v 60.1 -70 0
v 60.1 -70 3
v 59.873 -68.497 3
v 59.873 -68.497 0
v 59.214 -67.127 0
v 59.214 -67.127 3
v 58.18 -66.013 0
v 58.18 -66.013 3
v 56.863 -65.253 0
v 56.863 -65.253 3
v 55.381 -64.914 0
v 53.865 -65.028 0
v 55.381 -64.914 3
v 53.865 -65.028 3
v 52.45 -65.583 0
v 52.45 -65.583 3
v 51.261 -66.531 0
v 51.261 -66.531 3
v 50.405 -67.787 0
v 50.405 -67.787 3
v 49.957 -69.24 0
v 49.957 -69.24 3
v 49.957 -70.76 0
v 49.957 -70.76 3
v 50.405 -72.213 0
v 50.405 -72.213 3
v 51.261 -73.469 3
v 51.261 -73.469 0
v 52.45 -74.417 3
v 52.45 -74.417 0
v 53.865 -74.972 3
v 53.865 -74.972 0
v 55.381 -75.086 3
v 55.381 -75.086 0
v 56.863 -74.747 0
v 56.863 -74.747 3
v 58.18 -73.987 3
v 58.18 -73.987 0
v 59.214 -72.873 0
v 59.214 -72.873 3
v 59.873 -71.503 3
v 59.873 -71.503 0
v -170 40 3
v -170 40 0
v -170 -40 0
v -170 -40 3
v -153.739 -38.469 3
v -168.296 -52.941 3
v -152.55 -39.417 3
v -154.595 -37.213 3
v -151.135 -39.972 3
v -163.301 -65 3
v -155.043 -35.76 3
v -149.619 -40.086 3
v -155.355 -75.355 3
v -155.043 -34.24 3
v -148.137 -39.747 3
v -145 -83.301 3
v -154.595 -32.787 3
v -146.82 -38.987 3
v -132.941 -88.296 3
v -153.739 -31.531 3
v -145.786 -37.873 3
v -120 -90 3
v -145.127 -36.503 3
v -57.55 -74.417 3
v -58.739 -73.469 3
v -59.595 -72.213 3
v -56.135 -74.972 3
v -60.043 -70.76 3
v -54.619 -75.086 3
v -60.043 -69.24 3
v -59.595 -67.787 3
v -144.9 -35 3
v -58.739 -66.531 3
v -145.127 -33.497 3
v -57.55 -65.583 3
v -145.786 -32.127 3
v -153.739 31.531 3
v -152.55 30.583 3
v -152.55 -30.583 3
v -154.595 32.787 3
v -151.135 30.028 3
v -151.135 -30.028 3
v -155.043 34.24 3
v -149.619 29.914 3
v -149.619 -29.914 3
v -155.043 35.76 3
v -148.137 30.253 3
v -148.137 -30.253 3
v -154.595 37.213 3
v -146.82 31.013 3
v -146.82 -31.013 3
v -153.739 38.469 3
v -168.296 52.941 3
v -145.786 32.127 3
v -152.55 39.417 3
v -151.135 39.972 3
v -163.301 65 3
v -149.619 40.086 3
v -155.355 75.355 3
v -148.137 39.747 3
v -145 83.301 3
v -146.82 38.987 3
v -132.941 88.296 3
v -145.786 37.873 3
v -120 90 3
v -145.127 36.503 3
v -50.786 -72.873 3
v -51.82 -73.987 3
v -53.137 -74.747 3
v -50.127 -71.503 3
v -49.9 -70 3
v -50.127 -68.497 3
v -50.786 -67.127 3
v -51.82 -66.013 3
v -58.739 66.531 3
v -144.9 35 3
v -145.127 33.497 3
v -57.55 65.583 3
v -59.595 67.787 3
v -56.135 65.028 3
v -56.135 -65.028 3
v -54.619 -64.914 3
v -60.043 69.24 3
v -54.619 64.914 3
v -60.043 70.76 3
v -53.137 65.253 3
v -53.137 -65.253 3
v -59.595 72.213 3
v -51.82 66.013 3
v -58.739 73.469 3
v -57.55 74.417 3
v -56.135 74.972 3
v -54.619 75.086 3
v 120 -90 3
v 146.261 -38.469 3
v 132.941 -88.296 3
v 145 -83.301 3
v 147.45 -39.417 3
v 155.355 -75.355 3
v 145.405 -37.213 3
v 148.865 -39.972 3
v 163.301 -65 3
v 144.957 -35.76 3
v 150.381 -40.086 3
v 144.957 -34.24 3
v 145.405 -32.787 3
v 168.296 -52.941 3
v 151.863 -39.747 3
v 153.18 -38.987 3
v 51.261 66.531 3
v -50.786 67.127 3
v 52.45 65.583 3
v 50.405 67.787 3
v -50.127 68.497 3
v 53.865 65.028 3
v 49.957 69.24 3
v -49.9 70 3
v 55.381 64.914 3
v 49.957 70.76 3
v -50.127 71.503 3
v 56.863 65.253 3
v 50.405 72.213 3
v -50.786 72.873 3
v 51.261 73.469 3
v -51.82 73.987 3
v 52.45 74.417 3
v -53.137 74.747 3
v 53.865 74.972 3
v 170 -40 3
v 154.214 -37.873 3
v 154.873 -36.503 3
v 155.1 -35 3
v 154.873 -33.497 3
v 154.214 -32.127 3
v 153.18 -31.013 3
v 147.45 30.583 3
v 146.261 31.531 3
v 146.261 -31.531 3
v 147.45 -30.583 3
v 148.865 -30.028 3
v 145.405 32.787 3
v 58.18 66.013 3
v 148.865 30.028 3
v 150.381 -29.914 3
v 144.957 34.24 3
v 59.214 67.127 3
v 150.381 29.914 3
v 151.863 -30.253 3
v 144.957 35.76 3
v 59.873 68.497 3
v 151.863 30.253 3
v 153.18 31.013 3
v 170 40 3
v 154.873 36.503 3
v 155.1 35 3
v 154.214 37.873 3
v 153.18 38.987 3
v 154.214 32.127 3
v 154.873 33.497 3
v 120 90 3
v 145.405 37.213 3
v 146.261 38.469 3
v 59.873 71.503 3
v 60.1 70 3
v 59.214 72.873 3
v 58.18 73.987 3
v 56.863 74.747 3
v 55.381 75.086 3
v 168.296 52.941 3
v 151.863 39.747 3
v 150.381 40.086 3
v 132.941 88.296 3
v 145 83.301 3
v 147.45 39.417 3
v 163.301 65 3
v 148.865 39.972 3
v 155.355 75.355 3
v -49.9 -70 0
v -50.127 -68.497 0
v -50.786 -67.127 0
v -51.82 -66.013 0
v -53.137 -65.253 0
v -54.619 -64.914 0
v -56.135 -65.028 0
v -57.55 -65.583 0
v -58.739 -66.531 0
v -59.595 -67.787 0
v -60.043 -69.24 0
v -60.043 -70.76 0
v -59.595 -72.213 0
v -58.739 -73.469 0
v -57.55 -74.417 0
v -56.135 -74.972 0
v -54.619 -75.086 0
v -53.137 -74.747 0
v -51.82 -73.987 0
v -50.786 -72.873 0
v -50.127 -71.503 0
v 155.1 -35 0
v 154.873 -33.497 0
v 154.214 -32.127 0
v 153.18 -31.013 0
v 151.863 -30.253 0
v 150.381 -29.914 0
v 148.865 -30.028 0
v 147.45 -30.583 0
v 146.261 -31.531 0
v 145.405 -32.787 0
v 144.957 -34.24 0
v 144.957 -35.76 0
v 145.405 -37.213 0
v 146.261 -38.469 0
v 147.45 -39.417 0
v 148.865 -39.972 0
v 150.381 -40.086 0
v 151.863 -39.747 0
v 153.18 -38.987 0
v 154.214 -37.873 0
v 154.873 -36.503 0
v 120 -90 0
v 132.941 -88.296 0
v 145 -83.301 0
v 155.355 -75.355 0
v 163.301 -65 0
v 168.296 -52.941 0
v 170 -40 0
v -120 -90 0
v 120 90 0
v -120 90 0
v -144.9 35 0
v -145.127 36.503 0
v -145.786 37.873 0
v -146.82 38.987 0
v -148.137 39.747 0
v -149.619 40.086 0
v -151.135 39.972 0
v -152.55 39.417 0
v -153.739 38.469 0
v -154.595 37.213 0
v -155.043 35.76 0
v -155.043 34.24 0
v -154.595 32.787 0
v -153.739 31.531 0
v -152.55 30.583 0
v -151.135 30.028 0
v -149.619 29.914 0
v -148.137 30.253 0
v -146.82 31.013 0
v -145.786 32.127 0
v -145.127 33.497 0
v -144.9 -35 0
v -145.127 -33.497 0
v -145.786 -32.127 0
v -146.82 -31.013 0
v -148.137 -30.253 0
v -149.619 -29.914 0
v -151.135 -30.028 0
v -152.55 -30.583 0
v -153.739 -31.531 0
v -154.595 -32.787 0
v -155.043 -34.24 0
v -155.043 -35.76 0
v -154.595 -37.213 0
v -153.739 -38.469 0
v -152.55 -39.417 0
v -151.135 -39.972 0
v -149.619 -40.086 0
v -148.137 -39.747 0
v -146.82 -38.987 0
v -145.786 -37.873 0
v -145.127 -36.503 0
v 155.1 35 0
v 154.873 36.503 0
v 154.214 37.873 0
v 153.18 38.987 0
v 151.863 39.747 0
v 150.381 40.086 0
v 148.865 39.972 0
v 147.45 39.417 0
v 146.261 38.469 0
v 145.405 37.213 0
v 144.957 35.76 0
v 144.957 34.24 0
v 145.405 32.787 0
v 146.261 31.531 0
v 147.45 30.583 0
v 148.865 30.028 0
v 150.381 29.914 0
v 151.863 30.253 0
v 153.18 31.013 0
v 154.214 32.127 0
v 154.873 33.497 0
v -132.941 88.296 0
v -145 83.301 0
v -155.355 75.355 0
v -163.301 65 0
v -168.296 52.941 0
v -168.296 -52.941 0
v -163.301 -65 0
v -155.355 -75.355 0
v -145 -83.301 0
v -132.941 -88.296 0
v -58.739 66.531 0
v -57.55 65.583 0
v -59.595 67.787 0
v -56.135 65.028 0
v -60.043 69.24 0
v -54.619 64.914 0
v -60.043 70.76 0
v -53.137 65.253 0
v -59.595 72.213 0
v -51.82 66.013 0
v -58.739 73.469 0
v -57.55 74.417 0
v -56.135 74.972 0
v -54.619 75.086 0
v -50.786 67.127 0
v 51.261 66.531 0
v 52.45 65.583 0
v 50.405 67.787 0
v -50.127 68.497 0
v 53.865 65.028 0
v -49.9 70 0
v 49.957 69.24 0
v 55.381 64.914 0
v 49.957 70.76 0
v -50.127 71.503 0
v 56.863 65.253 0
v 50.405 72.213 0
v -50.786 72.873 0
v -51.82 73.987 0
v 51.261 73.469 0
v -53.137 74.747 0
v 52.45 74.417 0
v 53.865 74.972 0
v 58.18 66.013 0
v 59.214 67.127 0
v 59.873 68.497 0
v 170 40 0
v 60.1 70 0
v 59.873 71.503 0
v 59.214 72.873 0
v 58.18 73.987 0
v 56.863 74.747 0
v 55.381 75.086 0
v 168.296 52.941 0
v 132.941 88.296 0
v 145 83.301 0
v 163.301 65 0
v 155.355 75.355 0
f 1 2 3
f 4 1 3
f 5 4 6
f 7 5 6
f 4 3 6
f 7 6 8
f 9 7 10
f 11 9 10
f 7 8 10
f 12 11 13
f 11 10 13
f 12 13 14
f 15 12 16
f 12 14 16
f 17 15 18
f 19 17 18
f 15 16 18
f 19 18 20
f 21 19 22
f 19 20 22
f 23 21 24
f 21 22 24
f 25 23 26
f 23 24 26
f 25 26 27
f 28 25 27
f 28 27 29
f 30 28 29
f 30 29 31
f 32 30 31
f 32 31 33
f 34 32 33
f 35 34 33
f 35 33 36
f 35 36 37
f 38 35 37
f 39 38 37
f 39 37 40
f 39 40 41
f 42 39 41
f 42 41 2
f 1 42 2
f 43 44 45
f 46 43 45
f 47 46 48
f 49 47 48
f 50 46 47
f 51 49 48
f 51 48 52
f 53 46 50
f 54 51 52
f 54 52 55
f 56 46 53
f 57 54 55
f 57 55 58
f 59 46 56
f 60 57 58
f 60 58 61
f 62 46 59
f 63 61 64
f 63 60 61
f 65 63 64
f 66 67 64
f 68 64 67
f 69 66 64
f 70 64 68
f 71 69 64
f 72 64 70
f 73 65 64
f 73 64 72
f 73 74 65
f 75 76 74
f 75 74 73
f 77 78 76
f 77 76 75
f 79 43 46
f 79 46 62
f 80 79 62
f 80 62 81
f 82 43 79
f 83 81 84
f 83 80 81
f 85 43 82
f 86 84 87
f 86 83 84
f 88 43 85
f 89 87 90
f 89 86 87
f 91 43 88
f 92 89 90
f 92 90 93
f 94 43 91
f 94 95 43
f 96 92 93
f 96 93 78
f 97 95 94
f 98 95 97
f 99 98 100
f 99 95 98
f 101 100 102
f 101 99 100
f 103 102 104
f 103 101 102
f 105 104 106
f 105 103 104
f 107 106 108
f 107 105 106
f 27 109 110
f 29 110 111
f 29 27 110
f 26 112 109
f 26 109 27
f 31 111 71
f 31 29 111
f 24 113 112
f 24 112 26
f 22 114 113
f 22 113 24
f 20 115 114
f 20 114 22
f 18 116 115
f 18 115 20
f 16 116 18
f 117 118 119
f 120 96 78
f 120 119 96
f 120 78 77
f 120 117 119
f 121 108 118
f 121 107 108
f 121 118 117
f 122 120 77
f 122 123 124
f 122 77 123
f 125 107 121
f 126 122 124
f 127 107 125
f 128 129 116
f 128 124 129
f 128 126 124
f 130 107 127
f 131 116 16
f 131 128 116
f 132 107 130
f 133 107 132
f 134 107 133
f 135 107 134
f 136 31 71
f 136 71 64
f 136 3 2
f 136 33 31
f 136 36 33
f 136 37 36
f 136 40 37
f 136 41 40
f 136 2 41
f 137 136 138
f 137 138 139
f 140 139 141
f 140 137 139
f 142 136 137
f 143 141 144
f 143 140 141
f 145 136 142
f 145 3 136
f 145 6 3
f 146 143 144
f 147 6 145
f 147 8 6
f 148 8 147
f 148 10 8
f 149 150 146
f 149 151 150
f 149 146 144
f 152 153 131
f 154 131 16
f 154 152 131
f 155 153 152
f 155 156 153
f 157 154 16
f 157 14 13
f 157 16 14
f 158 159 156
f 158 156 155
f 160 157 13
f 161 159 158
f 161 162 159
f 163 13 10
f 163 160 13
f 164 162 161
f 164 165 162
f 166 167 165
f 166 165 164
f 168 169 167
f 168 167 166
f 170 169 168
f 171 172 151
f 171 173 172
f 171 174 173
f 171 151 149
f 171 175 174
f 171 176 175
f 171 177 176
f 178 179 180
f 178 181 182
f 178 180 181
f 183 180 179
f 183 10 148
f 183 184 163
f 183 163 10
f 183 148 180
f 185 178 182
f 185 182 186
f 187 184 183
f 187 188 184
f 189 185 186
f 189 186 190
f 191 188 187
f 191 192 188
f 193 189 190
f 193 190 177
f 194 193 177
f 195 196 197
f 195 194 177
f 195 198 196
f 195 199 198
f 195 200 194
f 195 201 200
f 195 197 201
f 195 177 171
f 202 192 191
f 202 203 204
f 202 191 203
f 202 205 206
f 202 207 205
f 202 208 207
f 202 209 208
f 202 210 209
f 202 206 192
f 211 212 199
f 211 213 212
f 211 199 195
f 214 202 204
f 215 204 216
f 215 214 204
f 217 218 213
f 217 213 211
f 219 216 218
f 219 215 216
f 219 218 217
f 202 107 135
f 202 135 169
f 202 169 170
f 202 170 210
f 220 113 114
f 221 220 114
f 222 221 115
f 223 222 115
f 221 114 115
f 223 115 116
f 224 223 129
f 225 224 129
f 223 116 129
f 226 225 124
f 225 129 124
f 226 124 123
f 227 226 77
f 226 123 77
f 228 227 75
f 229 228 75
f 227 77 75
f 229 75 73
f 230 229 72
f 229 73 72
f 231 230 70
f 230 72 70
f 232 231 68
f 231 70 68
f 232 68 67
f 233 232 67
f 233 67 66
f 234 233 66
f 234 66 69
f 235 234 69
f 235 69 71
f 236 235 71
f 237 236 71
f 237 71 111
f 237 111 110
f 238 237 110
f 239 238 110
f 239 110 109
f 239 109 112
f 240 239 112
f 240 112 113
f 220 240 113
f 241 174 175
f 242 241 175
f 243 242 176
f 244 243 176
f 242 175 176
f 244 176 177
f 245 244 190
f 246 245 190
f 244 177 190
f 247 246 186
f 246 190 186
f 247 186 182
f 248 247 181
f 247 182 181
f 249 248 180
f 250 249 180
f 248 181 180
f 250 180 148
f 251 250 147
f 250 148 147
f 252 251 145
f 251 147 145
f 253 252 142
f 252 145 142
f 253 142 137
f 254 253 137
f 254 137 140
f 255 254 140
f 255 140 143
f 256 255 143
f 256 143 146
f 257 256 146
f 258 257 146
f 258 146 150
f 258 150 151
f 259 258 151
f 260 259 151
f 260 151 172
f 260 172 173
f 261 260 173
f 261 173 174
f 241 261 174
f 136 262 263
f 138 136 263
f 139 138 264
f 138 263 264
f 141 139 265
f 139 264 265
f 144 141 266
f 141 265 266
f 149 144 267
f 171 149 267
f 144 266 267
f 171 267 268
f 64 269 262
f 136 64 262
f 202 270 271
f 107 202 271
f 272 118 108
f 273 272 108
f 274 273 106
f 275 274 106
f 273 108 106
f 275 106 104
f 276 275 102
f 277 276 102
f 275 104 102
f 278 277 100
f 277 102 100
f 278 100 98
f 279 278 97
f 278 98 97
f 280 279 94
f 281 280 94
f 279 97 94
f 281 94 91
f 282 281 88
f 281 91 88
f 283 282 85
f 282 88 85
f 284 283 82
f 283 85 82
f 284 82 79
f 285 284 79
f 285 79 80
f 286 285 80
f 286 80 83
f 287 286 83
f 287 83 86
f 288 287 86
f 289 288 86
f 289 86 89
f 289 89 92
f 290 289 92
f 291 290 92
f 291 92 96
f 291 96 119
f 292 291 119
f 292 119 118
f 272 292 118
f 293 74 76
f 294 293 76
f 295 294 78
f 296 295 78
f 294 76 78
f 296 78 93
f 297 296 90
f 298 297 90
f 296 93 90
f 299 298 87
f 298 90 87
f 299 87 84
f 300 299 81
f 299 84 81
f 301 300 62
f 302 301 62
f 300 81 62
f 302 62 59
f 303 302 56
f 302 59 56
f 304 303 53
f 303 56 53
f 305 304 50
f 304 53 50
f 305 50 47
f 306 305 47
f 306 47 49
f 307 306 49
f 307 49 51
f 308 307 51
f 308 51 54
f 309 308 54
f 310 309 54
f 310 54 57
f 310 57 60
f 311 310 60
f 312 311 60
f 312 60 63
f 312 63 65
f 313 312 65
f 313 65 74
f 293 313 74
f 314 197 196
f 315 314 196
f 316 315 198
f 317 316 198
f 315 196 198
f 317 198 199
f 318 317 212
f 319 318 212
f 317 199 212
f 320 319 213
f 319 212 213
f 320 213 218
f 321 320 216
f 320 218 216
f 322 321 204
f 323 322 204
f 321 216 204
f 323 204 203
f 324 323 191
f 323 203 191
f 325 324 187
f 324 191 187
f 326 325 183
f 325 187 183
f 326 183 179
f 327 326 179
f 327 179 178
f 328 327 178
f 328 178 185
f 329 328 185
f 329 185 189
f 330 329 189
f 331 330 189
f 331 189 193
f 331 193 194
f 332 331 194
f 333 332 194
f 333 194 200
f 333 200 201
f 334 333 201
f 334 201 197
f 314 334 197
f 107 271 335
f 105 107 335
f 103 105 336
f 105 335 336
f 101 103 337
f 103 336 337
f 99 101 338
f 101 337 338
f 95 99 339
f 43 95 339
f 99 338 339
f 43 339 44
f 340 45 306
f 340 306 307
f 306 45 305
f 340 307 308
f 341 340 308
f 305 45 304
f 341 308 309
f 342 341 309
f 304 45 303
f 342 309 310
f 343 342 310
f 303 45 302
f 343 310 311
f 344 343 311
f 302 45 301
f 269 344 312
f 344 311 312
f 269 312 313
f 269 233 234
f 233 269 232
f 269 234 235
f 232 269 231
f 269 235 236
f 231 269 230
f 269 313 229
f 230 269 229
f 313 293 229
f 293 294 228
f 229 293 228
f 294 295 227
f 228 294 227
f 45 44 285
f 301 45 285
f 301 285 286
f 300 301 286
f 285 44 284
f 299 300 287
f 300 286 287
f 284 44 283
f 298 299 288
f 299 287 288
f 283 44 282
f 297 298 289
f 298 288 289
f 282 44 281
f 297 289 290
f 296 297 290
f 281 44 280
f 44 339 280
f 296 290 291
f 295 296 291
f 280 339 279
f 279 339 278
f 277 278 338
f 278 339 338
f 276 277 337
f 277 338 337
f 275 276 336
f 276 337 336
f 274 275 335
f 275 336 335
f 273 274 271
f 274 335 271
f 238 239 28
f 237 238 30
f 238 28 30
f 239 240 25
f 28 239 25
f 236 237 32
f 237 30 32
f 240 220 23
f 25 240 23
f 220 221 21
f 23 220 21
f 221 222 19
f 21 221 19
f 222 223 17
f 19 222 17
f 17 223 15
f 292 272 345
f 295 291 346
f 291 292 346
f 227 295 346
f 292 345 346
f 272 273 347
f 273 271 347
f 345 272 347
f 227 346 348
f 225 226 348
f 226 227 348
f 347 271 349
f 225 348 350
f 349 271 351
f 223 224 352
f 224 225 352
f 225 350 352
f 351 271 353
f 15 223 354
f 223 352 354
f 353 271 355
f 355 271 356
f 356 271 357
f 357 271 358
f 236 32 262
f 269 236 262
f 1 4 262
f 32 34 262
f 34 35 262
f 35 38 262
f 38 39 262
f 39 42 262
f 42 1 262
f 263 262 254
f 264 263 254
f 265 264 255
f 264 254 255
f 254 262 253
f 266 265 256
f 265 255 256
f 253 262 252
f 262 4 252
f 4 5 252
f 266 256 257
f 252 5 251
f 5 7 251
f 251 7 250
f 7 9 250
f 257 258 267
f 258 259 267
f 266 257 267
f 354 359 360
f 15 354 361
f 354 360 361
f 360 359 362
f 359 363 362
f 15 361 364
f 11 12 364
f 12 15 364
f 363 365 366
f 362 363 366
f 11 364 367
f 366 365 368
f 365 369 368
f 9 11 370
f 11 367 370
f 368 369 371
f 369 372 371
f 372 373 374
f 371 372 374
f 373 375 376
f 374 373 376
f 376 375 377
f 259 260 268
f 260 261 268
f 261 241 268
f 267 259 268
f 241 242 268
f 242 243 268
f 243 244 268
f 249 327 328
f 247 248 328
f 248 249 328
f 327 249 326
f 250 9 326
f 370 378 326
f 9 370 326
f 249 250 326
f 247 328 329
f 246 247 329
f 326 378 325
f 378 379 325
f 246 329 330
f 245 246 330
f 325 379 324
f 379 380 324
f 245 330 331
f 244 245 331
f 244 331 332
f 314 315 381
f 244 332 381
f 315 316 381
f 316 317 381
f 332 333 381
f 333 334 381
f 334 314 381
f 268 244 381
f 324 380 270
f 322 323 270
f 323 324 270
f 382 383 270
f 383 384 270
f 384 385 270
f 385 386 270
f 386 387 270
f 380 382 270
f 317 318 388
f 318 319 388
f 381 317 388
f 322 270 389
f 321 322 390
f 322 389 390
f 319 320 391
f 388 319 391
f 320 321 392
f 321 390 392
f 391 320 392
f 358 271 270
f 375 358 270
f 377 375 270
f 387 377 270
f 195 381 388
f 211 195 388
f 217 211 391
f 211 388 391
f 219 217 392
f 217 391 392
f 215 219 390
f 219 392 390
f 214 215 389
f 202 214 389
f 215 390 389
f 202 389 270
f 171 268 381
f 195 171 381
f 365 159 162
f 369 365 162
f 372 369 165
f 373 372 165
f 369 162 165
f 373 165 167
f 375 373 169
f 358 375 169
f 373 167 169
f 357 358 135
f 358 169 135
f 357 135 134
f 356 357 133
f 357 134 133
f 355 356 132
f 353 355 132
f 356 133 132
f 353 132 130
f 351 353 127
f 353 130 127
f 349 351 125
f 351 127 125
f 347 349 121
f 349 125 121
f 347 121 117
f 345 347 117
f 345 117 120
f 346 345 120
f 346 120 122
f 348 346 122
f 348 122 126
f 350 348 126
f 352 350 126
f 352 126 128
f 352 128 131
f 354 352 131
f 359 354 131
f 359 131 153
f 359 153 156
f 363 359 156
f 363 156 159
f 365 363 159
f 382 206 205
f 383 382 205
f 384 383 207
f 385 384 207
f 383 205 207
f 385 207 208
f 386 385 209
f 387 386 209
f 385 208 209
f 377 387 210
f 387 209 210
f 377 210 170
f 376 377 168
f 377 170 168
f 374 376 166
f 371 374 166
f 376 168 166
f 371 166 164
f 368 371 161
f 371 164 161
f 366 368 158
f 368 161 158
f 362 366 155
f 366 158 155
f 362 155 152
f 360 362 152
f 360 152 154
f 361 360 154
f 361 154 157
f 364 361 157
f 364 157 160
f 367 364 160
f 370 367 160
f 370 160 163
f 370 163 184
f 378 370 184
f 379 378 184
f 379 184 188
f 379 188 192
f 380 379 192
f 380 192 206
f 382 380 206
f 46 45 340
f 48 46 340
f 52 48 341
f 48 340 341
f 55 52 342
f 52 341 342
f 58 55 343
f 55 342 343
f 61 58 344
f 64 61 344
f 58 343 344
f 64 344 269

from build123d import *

# Parameters (mm, degrees)
DODANIE_WYCI_GNI_CIE1_DEPTH = 3
OTW_R_GWINTOWANY_M121_D     = 10.2


with BuildPart() as part:
    # Szkic1 → Dodanie-wyciągnięcie1 (new body)
    with BuildSketch(Plane.XY):
        with BuildLine():
            Line((-120, -90), (120, -90))
            ThreePointArc((120, -90), (155.355339059, -75.355339059), (170, -40))
            Line((170, -40), (170, 40))
            ThreePointArc((170, 40), (155.355339059, 75.355339059), (120, 90))
            Line((120, 90), (-120, 90))
            ThreePointArc((-120, 90), (-155.355339059, 75.355339059), (-170, 40))
            Line((-170, 40), (-170, -40))
            ThreePointArc((-170, -40), (-155.355339059, -75.355339059), (-120, -90))
        make_face()
    extrude(amount=DODANIE_WYCI_GNI_CIE1_DEPTH)

    # Otwór gwintowany M121 (through all)
    with Locations(Plane(origin=(0, 0, 0), x_dir=(-1, 0, 0), z_dir=(0, 0, -1))):
        with Locations((55, 70), (-55, 70), (55, -70), (-55, -70), (-150, 35), (-150, -35), (150, -35), (150, 35)):
            Hole(OTW_R_GWINTOWANY_M121_D / 2)


solid = part.part
